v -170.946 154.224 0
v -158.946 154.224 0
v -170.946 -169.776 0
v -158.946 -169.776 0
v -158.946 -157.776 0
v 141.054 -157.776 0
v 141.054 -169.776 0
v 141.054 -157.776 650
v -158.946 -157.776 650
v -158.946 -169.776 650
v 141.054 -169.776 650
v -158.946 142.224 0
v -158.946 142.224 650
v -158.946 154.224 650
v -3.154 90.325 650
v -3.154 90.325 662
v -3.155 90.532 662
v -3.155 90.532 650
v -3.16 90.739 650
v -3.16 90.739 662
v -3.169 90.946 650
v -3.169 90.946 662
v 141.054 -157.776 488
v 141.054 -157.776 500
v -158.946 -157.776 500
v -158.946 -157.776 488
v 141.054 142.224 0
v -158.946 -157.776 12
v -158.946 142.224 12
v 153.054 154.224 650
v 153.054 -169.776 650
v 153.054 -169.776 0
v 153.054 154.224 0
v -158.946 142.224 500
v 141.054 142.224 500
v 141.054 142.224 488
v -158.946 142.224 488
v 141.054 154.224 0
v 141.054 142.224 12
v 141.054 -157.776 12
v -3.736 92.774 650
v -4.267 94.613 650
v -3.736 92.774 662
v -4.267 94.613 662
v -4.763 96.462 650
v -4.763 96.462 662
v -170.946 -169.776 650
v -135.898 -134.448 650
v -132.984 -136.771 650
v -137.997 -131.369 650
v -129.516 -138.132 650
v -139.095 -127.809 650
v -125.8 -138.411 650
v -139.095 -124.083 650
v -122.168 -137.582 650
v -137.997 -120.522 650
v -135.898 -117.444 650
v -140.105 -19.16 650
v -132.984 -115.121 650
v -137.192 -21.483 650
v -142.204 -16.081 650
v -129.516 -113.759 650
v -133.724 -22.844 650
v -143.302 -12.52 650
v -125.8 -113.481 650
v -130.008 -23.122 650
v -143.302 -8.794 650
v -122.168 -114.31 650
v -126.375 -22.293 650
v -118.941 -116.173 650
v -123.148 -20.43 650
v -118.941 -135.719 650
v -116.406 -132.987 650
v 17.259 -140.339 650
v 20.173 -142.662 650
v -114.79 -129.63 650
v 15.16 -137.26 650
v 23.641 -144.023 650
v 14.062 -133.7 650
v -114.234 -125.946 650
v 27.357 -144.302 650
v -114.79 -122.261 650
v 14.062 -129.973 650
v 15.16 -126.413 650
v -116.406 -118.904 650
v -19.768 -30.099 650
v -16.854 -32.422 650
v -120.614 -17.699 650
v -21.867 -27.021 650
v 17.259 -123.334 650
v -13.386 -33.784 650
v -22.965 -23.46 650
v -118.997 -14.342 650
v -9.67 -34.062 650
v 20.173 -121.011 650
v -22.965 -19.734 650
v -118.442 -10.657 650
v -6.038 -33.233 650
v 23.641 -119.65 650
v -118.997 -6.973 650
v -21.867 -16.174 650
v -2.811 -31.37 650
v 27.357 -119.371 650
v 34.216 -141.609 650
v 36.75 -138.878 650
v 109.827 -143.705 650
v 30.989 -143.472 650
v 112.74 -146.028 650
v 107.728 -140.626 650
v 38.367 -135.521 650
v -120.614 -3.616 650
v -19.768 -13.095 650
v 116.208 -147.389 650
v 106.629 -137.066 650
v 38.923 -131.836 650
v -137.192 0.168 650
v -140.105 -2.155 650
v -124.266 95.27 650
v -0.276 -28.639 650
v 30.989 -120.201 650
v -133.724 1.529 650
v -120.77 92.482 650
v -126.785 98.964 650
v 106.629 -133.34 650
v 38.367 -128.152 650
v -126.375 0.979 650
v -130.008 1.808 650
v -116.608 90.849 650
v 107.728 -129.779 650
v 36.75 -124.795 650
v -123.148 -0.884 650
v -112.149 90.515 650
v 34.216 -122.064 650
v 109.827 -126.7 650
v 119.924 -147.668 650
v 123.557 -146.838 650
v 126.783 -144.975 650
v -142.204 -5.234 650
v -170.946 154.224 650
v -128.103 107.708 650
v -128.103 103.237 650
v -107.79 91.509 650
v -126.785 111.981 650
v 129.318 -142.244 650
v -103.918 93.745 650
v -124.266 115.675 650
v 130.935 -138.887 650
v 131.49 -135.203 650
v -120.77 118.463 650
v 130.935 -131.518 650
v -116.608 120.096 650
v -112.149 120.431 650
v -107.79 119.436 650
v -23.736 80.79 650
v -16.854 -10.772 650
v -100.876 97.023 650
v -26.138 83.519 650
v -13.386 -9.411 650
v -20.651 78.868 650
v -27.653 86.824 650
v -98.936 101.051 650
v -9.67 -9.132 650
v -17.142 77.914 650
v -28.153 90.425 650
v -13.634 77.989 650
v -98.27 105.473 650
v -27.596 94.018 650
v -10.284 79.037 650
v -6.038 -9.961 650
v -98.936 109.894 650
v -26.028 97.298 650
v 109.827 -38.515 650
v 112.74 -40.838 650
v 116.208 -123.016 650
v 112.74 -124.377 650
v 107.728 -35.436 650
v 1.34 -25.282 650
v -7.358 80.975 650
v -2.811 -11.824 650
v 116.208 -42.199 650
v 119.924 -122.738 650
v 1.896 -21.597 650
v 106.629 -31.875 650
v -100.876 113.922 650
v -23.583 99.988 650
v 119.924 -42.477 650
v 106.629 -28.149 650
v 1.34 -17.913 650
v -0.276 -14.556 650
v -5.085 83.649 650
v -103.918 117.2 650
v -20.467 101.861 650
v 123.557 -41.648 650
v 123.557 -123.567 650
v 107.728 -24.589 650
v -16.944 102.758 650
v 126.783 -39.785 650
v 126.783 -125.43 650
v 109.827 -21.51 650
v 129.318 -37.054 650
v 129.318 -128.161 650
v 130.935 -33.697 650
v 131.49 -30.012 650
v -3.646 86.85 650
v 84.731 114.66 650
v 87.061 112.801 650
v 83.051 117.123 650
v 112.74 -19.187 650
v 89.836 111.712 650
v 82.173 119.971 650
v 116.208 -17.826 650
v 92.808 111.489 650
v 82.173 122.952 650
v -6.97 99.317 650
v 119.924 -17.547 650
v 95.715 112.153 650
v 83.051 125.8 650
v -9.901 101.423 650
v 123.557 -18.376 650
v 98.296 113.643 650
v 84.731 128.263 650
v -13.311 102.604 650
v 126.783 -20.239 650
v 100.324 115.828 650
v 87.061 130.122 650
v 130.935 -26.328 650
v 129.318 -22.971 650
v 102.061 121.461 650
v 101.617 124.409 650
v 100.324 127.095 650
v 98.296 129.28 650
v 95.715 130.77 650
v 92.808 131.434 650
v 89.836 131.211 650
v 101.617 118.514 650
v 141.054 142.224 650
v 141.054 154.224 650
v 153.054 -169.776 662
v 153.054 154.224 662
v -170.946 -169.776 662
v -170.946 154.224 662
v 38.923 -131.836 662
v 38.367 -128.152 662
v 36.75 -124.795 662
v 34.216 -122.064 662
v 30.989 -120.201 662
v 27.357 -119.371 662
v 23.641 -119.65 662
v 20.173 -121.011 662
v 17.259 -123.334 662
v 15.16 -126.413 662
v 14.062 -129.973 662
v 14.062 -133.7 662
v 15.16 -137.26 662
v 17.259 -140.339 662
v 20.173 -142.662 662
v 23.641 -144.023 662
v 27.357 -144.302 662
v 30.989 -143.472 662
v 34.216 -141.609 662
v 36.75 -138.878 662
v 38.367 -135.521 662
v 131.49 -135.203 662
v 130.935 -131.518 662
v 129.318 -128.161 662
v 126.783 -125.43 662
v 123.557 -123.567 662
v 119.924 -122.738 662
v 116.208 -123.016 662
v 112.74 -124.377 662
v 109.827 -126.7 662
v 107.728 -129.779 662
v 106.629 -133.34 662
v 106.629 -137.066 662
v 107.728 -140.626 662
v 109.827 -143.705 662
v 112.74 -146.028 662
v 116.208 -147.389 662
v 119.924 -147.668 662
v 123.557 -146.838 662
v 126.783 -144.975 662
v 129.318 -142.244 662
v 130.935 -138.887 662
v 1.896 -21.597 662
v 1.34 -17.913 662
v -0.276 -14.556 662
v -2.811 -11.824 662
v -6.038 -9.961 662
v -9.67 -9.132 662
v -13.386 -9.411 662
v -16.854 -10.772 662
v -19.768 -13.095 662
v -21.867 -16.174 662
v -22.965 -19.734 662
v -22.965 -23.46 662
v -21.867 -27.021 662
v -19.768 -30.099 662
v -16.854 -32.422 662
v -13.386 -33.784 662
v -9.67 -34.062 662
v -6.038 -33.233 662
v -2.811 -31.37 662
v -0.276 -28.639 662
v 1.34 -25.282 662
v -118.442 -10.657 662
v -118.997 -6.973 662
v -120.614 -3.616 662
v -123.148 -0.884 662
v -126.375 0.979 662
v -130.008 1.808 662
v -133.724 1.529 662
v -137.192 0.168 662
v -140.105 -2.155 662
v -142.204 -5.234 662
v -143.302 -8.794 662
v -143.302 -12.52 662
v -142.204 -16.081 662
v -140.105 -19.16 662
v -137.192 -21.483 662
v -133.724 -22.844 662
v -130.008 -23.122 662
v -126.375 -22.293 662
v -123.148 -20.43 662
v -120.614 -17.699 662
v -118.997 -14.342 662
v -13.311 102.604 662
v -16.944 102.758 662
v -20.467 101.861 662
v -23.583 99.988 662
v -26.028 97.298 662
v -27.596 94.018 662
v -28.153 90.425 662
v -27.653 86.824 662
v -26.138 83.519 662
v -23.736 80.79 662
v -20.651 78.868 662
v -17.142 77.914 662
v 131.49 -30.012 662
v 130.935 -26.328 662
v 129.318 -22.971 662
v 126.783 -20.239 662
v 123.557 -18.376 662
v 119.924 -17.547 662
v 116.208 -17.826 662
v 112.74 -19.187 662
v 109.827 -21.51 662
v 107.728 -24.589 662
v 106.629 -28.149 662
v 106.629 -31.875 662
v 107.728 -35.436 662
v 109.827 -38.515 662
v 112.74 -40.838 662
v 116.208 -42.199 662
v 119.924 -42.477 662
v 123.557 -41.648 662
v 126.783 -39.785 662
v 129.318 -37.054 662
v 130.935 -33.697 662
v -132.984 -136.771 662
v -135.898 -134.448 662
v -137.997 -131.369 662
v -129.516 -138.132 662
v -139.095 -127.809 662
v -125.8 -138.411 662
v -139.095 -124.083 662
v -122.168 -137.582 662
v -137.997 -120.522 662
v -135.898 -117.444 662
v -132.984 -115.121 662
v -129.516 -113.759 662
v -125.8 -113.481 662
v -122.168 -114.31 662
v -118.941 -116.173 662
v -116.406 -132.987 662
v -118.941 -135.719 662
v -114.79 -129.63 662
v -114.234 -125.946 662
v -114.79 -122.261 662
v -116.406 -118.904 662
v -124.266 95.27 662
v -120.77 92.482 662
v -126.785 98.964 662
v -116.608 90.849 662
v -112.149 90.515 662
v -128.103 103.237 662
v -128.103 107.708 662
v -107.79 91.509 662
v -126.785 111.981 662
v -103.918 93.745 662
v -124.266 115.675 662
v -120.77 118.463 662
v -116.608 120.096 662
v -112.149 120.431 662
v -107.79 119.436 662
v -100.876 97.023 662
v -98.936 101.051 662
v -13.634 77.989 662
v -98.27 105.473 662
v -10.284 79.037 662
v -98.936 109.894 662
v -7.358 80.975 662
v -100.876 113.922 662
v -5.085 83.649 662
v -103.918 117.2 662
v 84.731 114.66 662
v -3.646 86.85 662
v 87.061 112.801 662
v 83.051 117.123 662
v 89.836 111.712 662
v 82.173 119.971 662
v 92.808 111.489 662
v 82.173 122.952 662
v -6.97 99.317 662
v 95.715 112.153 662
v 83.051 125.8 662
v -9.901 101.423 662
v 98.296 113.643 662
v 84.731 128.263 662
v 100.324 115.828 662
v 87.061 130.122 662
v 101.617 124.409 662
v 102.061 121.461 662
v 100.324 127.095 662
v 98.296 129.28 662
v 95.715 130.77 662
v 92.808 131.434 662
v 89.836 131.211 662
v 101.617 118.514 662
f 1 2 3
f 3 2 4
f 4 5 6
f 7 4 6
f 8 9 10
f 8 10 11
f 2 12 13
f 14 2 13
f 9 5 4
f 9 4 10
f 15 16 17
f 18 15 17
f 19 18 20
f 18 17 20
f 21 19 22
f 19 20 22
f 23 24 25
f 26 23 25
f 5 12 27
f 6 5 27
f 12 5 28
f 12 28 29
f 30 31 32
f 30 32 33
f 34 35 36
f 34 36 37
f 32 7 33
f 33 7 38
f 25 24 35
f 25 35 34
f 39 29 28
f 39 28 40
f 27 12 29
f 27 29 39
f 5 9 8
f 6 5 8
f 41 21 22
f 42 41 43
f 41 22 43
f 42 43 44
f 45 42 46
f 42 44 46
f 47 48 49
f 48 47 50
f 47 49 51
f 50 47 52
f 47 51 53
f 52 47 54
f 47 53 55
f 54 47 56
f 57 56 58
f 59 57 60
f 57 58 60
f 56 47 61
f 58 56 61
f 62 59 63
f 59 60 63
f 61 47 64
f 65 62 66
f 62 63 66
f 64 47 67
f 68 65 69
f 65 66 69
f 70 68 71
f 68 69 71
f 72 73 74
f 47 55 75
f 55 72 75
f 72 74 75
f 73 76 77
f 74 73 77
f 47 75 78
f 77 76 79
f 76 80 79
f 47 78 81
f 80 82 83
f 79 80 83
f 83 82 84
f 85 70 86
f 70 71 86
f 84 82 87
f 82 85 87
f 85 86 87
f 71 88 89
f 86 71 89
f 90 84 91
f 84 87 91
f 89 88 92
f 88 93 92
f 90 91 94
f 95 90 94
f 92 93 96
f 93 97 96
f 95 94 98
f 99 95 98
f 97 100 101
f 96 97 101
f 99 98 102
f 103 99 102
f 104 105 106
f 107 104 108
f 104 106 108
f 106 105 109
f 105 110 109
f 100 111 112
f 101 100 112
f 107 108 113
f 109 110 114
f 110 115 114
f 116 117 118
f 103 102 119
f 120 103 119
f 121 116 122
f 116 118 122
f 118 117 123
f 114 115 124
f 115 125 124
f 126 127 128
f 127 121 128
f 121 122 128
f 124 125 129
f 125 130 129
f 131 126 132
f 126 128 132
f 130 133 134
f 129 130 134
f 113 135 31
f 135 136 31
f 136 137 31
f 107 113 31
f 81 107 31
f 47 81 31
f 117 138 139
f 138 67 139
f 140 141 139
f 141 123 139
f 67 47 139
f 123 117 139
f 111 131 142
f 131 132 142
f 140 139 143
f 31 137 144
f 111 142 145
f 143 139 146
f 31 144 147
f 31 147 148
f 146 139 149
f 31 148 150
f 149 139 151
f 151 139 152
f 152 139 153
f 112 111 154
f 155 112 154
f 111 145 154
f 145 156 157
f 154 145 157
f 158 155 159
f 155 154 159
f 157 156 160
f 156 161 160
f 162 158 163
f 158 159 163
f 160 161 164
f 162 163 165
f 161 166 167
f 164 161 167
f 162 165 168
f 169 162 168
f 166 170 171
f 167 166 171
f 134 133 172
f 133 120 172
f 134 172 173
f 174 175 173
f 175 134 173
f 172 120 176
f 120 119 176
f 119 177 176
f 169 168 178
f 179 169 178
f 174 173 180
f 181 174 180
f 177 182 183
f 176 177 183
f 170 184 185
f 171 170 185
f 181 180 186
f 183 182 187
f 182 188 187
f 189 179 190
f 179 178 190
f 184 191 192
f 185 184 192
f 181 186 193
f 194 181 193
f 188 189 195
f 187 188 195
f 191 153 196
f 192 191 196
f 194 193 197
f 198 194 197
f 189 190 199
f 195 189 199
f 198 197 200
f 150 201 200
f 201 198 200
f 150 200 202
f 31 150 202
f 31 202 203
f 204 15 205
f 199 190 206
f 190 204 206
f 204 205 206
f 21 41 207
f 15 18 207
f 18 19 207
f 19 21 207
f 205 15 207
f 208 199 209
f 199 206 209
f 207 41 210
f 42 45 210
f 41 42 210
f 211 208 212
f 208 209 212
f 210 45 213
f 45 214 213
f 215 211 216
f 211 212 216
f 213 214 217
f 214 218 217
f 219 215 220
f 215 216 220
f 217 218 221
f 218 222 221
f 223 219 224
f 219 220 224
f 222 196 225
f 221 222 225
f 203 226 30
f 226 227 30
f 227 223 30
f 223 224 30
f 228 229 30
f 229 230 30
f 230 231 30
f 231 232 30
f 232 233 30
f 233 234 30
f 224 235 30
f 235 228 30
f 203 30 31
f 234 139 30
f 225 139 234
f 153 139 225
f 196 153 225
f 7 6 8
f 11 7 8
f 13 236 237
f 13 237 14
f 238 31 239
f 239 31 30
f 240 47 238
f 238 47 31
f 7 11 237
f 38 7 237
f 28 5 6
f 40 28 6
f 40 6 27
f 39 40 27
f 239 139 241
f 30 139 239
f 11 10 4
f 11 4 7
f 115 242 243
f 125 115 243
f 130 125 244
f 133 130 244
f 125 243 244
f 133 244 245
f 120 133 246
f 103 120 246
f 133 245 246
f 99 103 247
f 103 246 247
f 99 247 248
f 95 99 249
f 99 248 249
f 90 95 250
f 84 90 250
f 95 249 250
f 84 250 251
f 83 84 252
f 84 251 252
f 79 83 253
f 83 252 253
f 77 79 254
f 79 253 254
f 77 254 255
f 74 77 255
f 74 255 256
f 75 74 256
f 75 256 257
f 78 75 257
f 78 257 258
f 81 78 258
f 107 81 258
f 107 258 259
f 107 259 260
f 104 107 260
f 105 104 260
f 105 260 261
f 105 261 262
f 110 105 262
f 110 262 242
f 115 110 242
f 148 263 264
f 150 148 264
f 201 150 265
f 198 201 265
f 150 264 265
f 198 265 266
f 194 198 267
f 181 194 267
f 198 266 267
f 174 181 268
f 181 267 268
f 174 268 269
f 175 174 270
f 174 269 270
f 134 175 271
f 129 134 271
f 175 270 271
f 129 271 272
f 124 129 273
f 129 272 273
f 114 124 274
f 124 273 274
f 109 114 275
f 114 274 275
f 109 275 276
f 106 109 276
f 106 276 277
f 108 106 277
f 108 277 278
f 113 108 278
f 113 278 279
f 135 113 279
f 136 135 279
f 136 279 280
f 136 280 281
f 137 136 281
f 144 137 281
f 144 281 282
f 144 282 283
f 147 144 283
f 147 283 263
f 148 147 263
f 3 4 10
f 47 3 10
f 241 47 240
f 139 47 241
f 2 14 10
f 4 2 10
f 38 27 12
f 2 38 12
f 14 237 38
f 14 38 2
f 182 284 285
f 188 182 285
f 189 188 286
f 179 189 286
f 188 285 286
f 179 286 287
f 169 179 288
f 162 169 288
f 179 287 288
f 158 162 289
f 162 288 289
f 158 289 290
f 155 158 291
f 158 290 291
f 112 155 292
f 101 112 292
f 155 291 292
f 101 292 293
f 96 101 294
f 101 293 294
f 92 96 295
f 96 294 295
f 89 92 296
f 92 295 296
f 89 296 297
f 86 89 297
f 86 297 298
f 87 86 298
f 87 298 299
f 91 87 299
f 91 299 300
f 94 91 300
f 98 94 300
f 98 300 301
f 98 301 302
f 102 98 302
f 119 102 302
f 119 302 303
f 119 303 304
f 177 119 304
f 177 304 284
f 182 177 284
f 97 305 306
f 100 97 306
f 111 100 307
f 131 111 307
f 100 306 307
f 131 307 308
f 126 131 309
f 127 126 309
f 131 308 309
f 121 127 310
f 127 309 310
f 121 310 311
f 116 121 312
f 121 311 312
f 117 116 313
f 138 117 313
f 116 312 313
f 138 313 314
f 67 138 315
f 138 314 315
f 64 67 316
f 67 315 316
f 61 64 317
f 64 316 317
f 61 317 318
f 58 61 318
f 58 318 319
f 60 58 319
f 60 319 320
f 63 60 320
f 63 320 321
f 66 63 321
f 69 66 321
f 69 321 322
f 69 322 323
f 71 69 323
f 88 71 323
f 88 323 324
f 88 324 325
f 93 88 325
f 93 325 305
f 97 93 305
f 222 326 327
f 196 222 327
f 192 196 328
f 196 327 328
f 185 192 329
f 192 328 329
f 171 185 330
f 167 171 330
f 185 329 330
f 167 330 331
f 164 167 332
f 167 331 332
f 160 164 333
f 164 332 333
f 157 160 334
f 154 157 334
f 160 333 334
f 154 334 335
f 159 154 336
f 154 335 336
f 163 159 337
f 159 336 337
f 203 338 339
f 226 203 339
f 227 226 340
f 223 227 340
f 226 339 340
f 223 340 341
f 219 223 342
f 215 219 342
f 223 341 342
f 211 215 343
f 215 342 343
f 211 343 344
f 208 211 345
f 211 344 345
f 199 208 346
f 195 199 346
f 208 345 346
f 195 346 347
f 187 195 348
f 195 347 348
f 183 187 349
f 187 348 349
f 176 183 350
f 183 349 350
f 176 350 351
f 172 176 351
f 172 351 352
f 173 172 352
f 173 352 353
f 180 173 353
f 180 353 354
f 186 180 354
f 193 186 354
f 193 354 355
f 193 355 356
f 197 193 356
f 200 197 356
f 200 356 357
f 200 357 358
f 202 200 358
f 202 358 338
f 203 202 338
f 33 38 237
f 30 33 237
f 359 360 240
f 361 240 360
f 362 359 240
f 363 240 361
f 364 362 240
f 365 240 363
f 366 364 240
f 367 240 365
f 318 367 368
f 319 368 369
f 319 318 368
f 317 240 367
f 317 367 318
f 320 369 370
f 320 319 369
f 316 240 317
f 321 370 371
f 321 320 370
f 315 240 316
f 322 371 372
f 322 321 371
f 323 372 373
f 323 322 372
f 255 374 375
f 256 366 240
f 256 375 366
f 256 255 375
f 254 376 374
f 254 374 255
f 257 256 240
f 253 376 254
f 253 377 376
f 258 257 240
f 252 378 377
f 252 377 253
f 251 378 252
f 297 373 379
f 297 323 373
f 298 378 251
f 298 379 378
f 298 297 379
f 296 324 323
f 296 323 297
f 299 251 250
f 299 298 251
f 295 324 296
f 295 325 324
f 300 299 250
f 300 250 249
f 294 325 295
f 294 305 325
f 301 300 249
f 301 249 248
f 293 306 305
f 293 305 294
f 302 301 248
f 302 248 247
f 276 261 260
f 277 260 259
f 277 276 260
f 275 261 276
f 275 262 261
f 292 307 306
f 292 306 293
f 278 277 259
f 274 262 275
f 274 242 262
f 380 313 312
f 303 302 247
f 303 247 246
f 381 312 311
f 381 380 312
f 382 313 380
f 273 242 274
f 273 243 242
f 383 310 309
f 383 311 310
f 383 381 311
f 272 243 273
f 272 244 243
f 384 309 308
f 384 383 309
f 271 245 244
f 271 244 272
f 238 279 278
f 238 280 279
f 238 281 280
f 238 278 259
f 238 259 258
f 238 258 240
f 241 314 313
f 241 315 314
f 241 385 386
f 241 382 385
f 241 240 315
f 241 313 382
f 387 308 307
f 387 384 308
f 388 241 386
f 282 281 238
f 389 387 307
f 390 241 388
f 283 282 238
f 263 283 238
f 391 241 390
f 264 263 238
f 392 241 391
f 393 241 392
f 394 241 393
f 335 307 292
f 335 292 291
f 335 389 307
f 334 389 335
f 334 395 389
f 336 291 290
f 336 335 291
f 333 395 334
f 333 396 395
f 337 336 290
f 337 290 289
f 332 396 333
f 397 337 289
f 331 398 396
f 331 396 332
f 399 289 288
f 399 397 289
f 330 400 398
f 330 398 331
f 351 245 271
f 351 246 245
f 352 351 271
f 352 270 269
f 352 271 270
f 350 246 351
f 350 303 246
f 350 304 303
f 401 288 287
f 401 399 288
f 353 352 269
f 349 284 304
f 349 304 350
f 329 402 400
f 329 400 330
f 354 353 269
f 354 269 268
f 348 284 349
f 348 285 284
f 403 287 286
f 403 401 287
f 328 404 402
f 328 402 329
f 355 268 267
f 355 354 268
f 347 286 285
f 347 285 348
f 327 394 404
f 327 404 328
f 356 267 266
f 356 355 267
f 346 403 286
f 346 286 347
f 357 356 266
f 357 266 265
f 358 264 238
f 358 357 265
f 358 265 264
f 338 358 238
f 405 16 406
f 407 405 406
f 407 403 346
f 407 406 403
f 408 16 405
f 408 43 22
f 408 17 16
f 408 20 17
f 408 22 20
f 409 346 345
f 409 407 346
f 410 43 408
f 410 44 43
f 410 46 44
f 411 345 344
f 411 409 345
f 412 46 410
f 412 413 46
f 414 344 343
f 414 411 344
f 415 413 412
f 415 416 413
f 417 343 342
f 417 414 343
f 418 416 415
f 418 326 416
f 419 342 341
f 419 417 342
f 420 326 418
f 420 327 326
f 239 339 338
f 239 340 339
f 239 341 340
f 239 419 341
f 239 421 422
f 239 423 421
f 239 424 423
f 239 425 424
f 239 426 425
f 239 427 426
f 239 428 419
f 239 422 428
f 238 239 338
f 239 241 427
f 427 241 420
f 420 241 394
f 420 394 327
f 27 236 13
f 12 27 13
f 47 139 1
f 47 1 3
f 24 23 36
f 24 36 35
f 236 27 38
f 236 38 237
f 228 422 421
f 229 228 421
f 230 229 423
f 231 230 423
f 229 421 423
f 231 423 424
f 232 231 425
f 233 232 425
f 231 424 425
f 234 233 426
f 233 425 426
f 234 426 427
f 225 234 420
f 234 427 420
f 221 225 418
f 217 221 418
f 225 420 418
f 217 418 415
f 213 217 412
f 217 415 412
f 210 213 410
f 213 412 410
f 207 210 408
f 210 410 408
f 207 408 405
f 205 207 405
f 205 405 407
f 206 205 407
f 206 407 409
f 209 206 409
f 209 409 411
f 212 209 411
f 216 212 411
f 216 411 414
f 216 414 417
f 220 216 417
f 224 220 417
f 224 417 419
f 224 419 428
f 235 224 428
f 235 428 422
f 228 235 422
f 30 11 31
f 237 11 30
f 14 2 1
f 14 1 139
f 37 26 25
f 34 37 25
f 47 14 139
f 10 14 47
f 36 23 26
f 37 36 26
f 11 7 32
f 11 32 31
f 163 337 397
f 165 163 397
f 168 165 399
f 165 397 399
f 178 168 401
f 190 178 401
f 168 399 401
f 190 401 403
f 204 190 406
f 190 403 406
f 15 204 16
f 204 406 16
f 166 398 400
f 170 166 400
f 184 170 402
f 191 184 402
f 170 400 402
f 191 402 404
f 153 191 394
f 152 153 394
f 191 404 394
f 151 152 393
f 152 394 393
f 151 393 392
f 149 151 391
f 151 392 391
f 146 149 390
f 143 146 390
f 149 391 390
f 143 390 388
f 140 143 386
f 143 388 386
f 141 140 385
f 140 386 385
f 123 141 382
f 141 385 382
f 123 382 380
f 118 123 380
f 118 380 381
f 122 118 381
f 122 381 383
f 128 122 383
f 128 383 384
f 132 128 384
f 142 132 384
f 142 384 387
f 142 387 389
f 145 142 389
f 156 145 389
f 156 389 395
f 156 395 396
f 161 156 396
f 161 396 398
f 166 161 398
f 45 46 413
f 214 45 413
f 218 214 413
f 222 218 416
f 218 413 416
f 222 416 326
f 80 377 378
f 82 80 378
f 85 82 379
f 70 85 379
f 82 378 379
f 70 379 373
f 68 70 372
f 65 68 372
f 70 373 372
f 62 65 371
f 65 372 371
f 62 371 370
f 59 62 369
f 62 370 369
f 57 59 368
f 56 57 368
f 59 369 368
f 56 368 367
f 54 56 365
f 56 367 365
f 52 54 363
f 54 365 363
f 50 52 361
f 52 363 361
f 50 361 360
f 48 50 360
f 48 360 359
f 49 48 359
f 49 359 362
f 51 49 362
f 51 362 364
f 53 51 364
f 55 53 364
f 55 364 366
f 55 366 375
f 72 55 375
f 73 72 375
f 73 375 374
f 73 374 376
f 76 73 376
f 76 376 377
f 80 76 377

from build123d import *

# Parameters (mm, degrees)
F0_W      = 300
F0_H      = 300
F1_DEPTH  = 12
F2_W      = 300
F2_H      = 650
F3_DEPTH  = 12
F4_W      = 300
F4_H      = 650
F5_DEPTH  = 12
F6_W      = 300
F6_H      = 12
F7_DEPTH  = 300
F8_W      = 324
F8_H      = 650
F9_DEPTH  = 12
F10_W     = 324
F10_H     = 650
F11_DEPTH = 12
F12_W     = 324
F12_H     = 324
F13_DEPTH = 12
F14_R     = 15
F14_R_2   = 10
F14_R_3   = 12.5
F15_DEPTH = 25


with BuildPart() as f1:
    # F0 (on Top) → F1 (new body)
    with BuildSketch(Plane.XY):
        with Locations((-8.9463724196, -7.7756721587)):
            Rectangle(F0_W, F0_H)
    extrude(amount=F1_DEPTH)


with BuildPart() as f3:
    # F2 (on face) → F3 (new body)
    with BuildSketch(Plane.XZ.offset(157.7756721587)):
        with Locations((-8.9463724196, 325)):
            Rectangle(F2_W, F2_H)
    extrude(amount=F3_DEPTH)


with BuildPart() as f5:
    # F4 (on face) → F5 (new body)
    with BuildSketch(Plane(origin=(0, 142.2243278413, 0), x_dir=(-1, 0, 0), z_dir=(0, 1, 0))):
        with Locations((8.9463724196, 325)):
            Rectangle(F4_W, F4_H)
    extrude(amount=F5_DEPTH)


with BuildPart() as f7:
    # F6 (on face) → F7 (new body, through all)
    with BuildSketch(Plane(origin=(0, -157.7756721587, 0), x_dir=(-1, 0, 0), z_dir=(0, 1, 0))):
        with Locations((8.9463724196, 494)):
            Rectangle(F6_W, F6_H)
    extrude(amount=F7_DEPTH)


with BuildPart() as f9:
    # F8 (on face) → F9 (new body)
    with BuildSketch(Plane.YZ.offset(141.0536275804)):
        with Locations((-7.7756721587, 325)):
            Rectangle(F8_W, F8_H)
    extrude(amount=F9_DEPTH)


with BuildPart() as f11:
    # F10 (on face) → F11 (new body)
    with BuildSketch(Plane(origin=(-158.9463724196, 0, 0), x_dir=(0, -1, 0), z_dir=(-1, 0, 0))):
        with Locations((7.7756721587, 325)):
            Rectangle(F10_W, F10_H)
    extrude(amount=F11_DEPTH)


with BuildPart() as f13:
    # F12 (on face) → F13 (new body)
    with BuildSketch(Plane.XY.offset(650)):
        with Locations((-8.9463724196, -7.7756721587)):
            Rectangle(F12_W, F12_H)
    extrude(amount=F13_DEPTH)

    # F14 (on face) → F15 (cut)
    with BuildSketch(Plane.XY.offset(662)):
        with Locations((-113.2700666785, 105.4725795984)):
            Circle(F14_R)
        with BuildLine():
            ThreePointArc((-17.1423703304, 77.9141689984), (-7.357789919, 80.9747914405), (-3.1535729766, 90.325191617))
            ThreePointArc((-3.1535729766, 90.325191617), (-3.1574254863, 90.6355106494), (-3.1689806409, 90.9456384006))
            ThreePointArc((-3.1689806409, 90.9456384006), (-4.0057926873, 93.692128302), (-4.7634123003, 96.4615097676))
            ThreePointArc((-4.7634123003, 96.4615097676), (-8.3592842629, 100.4762187651), (-13.311225583, 102.6037668067))
            ThreePointArc((-13.311225583, 102.6037668067), (-14.4526765002, 90.1388455994), (-17.1423703304, 77.9141689984))
        make_face()
        with BuildLine():
            ThreePointArc((-13.311225583, 102.6037668067), (-28.0057467489, 92.2419083669), (-17.1423703304, 77.9141689984))
            ThreePointArc((-17.1423703304, 77.9141689984), (-14.4526765002, 90.1388455994), (-13.311225583, 102.6037668067))
        make_face()
        with Locations((92.0611768961, 121.4614883065)):
            Circle(F14_R_2)
        with Locations((-10.6044458225, -21.5971637517)):
            Circle(F14_R_3)
        with Locations((-130.94201684, -10.6573840603)):
            Circle(F14_R_3)
        with Locations((118.989855051, -30.0123784691)):
            Circle(F14_R_3)
        with Locations((118.989855051, -135.2025717497)):
            Circle(F14_R_3)
        with Locations((26.4225006104, -131.8364739418)):
            Circle(F14_R_3)
        with Locations((-126.734405756, -125.9458363056)):
            Circle(F14_R_3)
    extrude(amount=-F15_DEPTH, mode=Mode.SUBTRACT)


solid = Compound([f1.part, f3.part, f5.part, f7.part, f9.part, f11.part, f13.part])
